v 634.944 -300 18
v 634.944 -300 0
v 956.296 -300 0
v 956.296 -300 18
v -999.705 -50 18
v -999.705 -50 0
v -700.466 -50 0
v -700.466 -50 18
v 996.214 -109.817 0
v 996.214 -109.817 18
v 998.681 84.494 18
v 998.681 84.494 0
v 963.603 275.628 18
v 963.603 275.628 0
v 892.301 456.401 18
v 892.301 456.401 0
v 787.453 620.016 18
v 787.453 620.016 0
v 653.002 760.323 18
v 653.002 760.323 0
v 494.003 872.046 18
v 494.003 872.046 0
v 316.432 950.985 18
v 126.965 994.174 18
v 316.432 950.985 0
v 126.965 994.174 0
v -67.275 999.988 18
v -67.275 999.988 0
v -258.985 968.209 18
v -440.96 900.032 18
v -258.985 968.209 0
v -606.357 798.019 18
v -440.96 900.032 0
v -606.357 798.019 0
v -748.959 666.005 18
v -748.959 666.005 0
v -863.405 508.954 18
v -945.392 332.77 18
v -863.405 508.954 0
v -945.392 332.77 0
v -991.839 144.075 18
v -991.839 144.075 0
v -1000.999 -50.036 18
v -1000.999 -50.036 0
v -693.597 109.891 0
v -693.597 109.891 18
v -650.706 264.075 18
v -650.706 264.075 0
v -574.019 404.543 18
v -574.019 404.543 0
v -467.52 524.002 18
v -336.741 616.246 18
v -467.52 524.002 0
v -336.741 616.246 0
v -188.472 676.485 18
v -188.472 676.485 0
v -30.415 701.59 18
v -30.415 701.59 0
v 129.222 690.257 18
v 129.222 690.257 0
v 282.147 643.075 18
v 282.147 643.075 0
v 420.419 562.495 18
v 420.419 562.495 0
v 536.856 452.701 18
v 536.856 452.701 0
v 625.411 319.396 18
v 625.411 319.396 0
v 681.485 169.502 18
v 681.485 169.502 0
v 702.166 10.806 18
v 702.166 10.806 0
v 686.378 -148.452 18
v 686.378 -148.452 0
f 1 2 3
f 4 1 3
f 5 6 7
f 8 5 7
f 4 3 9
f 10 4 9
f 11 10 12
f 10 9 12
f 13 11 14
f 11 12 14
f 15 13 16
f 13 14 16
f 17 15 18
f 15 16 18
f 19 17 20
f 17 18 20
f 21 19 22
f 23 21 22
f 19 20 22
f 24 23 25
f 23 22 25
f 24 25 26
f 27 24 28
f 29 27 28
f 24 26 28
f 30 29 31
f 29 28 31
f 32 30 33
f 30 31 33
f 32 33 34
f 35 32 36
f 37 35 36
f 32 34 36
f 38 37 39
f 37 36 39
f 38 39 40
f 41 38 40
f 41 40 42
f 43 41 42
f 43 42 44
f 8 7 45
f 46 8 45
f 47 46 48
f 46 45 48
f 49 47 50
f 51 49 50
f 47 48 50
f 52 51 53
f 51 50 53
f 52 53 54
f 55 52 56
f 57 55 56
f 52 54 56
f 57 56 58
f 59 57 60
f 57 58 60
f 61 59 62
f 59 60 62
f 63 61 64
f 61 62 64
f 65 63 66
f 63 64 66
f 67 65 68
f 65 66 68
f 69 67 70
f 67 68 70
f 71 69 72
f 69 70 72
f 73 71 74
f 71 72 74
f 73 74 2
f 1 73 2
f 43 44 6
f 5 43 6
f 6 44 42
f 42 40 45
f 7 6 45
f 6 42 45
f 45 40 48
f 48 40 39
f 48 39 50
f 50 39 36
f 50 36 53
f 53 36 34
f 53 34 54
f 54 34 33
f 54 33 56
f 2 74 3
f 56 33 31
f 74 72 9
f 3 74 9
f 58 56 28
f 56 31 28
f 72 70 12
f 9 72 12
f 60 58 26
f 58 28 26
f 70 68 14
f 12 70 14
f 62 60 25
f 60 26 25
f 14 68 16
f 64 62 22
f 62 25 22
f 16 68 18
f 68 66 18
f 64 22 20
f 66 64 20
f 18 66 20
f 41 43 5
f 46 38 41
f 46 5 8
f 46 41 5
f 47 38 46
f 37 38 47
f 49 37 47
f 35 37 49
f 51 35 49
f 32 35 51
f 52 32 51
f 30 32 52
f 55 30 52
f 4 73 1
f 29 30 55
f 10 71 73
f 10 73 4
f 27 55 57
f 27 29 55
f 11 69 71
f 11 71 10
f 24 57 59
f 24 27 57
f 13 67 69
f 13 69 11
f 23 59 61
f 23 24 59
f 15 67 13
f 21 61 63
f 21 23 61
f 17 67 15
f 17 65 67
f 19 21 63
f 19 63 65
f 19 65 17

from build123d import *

# Parameters (mm, degrees)
F1_DEPTH = 18


with BuildPart() as f1:
    # F0 (on Top) → F1 (new body)
    with BuildSketch(Plane.XY):
        with BuildLine():
            ThreePointArc((-700.46645, -50), (129.221957, 690.257151), (634.9435, -300))
            Line((634.9435, -300), (956.296227, -300))
            ThreePointArc((956.296227, -300), (126.965132, 994.174194), (-1000.998961, -50.035513))
            Line((-1000.998961, -50.035513), (-999.705072, -50))
            Line((-999.705072, -50), (-700.46645, -50))
        make_face()
    extrude(amount=F1_DEPTH)


solid = f1.part
